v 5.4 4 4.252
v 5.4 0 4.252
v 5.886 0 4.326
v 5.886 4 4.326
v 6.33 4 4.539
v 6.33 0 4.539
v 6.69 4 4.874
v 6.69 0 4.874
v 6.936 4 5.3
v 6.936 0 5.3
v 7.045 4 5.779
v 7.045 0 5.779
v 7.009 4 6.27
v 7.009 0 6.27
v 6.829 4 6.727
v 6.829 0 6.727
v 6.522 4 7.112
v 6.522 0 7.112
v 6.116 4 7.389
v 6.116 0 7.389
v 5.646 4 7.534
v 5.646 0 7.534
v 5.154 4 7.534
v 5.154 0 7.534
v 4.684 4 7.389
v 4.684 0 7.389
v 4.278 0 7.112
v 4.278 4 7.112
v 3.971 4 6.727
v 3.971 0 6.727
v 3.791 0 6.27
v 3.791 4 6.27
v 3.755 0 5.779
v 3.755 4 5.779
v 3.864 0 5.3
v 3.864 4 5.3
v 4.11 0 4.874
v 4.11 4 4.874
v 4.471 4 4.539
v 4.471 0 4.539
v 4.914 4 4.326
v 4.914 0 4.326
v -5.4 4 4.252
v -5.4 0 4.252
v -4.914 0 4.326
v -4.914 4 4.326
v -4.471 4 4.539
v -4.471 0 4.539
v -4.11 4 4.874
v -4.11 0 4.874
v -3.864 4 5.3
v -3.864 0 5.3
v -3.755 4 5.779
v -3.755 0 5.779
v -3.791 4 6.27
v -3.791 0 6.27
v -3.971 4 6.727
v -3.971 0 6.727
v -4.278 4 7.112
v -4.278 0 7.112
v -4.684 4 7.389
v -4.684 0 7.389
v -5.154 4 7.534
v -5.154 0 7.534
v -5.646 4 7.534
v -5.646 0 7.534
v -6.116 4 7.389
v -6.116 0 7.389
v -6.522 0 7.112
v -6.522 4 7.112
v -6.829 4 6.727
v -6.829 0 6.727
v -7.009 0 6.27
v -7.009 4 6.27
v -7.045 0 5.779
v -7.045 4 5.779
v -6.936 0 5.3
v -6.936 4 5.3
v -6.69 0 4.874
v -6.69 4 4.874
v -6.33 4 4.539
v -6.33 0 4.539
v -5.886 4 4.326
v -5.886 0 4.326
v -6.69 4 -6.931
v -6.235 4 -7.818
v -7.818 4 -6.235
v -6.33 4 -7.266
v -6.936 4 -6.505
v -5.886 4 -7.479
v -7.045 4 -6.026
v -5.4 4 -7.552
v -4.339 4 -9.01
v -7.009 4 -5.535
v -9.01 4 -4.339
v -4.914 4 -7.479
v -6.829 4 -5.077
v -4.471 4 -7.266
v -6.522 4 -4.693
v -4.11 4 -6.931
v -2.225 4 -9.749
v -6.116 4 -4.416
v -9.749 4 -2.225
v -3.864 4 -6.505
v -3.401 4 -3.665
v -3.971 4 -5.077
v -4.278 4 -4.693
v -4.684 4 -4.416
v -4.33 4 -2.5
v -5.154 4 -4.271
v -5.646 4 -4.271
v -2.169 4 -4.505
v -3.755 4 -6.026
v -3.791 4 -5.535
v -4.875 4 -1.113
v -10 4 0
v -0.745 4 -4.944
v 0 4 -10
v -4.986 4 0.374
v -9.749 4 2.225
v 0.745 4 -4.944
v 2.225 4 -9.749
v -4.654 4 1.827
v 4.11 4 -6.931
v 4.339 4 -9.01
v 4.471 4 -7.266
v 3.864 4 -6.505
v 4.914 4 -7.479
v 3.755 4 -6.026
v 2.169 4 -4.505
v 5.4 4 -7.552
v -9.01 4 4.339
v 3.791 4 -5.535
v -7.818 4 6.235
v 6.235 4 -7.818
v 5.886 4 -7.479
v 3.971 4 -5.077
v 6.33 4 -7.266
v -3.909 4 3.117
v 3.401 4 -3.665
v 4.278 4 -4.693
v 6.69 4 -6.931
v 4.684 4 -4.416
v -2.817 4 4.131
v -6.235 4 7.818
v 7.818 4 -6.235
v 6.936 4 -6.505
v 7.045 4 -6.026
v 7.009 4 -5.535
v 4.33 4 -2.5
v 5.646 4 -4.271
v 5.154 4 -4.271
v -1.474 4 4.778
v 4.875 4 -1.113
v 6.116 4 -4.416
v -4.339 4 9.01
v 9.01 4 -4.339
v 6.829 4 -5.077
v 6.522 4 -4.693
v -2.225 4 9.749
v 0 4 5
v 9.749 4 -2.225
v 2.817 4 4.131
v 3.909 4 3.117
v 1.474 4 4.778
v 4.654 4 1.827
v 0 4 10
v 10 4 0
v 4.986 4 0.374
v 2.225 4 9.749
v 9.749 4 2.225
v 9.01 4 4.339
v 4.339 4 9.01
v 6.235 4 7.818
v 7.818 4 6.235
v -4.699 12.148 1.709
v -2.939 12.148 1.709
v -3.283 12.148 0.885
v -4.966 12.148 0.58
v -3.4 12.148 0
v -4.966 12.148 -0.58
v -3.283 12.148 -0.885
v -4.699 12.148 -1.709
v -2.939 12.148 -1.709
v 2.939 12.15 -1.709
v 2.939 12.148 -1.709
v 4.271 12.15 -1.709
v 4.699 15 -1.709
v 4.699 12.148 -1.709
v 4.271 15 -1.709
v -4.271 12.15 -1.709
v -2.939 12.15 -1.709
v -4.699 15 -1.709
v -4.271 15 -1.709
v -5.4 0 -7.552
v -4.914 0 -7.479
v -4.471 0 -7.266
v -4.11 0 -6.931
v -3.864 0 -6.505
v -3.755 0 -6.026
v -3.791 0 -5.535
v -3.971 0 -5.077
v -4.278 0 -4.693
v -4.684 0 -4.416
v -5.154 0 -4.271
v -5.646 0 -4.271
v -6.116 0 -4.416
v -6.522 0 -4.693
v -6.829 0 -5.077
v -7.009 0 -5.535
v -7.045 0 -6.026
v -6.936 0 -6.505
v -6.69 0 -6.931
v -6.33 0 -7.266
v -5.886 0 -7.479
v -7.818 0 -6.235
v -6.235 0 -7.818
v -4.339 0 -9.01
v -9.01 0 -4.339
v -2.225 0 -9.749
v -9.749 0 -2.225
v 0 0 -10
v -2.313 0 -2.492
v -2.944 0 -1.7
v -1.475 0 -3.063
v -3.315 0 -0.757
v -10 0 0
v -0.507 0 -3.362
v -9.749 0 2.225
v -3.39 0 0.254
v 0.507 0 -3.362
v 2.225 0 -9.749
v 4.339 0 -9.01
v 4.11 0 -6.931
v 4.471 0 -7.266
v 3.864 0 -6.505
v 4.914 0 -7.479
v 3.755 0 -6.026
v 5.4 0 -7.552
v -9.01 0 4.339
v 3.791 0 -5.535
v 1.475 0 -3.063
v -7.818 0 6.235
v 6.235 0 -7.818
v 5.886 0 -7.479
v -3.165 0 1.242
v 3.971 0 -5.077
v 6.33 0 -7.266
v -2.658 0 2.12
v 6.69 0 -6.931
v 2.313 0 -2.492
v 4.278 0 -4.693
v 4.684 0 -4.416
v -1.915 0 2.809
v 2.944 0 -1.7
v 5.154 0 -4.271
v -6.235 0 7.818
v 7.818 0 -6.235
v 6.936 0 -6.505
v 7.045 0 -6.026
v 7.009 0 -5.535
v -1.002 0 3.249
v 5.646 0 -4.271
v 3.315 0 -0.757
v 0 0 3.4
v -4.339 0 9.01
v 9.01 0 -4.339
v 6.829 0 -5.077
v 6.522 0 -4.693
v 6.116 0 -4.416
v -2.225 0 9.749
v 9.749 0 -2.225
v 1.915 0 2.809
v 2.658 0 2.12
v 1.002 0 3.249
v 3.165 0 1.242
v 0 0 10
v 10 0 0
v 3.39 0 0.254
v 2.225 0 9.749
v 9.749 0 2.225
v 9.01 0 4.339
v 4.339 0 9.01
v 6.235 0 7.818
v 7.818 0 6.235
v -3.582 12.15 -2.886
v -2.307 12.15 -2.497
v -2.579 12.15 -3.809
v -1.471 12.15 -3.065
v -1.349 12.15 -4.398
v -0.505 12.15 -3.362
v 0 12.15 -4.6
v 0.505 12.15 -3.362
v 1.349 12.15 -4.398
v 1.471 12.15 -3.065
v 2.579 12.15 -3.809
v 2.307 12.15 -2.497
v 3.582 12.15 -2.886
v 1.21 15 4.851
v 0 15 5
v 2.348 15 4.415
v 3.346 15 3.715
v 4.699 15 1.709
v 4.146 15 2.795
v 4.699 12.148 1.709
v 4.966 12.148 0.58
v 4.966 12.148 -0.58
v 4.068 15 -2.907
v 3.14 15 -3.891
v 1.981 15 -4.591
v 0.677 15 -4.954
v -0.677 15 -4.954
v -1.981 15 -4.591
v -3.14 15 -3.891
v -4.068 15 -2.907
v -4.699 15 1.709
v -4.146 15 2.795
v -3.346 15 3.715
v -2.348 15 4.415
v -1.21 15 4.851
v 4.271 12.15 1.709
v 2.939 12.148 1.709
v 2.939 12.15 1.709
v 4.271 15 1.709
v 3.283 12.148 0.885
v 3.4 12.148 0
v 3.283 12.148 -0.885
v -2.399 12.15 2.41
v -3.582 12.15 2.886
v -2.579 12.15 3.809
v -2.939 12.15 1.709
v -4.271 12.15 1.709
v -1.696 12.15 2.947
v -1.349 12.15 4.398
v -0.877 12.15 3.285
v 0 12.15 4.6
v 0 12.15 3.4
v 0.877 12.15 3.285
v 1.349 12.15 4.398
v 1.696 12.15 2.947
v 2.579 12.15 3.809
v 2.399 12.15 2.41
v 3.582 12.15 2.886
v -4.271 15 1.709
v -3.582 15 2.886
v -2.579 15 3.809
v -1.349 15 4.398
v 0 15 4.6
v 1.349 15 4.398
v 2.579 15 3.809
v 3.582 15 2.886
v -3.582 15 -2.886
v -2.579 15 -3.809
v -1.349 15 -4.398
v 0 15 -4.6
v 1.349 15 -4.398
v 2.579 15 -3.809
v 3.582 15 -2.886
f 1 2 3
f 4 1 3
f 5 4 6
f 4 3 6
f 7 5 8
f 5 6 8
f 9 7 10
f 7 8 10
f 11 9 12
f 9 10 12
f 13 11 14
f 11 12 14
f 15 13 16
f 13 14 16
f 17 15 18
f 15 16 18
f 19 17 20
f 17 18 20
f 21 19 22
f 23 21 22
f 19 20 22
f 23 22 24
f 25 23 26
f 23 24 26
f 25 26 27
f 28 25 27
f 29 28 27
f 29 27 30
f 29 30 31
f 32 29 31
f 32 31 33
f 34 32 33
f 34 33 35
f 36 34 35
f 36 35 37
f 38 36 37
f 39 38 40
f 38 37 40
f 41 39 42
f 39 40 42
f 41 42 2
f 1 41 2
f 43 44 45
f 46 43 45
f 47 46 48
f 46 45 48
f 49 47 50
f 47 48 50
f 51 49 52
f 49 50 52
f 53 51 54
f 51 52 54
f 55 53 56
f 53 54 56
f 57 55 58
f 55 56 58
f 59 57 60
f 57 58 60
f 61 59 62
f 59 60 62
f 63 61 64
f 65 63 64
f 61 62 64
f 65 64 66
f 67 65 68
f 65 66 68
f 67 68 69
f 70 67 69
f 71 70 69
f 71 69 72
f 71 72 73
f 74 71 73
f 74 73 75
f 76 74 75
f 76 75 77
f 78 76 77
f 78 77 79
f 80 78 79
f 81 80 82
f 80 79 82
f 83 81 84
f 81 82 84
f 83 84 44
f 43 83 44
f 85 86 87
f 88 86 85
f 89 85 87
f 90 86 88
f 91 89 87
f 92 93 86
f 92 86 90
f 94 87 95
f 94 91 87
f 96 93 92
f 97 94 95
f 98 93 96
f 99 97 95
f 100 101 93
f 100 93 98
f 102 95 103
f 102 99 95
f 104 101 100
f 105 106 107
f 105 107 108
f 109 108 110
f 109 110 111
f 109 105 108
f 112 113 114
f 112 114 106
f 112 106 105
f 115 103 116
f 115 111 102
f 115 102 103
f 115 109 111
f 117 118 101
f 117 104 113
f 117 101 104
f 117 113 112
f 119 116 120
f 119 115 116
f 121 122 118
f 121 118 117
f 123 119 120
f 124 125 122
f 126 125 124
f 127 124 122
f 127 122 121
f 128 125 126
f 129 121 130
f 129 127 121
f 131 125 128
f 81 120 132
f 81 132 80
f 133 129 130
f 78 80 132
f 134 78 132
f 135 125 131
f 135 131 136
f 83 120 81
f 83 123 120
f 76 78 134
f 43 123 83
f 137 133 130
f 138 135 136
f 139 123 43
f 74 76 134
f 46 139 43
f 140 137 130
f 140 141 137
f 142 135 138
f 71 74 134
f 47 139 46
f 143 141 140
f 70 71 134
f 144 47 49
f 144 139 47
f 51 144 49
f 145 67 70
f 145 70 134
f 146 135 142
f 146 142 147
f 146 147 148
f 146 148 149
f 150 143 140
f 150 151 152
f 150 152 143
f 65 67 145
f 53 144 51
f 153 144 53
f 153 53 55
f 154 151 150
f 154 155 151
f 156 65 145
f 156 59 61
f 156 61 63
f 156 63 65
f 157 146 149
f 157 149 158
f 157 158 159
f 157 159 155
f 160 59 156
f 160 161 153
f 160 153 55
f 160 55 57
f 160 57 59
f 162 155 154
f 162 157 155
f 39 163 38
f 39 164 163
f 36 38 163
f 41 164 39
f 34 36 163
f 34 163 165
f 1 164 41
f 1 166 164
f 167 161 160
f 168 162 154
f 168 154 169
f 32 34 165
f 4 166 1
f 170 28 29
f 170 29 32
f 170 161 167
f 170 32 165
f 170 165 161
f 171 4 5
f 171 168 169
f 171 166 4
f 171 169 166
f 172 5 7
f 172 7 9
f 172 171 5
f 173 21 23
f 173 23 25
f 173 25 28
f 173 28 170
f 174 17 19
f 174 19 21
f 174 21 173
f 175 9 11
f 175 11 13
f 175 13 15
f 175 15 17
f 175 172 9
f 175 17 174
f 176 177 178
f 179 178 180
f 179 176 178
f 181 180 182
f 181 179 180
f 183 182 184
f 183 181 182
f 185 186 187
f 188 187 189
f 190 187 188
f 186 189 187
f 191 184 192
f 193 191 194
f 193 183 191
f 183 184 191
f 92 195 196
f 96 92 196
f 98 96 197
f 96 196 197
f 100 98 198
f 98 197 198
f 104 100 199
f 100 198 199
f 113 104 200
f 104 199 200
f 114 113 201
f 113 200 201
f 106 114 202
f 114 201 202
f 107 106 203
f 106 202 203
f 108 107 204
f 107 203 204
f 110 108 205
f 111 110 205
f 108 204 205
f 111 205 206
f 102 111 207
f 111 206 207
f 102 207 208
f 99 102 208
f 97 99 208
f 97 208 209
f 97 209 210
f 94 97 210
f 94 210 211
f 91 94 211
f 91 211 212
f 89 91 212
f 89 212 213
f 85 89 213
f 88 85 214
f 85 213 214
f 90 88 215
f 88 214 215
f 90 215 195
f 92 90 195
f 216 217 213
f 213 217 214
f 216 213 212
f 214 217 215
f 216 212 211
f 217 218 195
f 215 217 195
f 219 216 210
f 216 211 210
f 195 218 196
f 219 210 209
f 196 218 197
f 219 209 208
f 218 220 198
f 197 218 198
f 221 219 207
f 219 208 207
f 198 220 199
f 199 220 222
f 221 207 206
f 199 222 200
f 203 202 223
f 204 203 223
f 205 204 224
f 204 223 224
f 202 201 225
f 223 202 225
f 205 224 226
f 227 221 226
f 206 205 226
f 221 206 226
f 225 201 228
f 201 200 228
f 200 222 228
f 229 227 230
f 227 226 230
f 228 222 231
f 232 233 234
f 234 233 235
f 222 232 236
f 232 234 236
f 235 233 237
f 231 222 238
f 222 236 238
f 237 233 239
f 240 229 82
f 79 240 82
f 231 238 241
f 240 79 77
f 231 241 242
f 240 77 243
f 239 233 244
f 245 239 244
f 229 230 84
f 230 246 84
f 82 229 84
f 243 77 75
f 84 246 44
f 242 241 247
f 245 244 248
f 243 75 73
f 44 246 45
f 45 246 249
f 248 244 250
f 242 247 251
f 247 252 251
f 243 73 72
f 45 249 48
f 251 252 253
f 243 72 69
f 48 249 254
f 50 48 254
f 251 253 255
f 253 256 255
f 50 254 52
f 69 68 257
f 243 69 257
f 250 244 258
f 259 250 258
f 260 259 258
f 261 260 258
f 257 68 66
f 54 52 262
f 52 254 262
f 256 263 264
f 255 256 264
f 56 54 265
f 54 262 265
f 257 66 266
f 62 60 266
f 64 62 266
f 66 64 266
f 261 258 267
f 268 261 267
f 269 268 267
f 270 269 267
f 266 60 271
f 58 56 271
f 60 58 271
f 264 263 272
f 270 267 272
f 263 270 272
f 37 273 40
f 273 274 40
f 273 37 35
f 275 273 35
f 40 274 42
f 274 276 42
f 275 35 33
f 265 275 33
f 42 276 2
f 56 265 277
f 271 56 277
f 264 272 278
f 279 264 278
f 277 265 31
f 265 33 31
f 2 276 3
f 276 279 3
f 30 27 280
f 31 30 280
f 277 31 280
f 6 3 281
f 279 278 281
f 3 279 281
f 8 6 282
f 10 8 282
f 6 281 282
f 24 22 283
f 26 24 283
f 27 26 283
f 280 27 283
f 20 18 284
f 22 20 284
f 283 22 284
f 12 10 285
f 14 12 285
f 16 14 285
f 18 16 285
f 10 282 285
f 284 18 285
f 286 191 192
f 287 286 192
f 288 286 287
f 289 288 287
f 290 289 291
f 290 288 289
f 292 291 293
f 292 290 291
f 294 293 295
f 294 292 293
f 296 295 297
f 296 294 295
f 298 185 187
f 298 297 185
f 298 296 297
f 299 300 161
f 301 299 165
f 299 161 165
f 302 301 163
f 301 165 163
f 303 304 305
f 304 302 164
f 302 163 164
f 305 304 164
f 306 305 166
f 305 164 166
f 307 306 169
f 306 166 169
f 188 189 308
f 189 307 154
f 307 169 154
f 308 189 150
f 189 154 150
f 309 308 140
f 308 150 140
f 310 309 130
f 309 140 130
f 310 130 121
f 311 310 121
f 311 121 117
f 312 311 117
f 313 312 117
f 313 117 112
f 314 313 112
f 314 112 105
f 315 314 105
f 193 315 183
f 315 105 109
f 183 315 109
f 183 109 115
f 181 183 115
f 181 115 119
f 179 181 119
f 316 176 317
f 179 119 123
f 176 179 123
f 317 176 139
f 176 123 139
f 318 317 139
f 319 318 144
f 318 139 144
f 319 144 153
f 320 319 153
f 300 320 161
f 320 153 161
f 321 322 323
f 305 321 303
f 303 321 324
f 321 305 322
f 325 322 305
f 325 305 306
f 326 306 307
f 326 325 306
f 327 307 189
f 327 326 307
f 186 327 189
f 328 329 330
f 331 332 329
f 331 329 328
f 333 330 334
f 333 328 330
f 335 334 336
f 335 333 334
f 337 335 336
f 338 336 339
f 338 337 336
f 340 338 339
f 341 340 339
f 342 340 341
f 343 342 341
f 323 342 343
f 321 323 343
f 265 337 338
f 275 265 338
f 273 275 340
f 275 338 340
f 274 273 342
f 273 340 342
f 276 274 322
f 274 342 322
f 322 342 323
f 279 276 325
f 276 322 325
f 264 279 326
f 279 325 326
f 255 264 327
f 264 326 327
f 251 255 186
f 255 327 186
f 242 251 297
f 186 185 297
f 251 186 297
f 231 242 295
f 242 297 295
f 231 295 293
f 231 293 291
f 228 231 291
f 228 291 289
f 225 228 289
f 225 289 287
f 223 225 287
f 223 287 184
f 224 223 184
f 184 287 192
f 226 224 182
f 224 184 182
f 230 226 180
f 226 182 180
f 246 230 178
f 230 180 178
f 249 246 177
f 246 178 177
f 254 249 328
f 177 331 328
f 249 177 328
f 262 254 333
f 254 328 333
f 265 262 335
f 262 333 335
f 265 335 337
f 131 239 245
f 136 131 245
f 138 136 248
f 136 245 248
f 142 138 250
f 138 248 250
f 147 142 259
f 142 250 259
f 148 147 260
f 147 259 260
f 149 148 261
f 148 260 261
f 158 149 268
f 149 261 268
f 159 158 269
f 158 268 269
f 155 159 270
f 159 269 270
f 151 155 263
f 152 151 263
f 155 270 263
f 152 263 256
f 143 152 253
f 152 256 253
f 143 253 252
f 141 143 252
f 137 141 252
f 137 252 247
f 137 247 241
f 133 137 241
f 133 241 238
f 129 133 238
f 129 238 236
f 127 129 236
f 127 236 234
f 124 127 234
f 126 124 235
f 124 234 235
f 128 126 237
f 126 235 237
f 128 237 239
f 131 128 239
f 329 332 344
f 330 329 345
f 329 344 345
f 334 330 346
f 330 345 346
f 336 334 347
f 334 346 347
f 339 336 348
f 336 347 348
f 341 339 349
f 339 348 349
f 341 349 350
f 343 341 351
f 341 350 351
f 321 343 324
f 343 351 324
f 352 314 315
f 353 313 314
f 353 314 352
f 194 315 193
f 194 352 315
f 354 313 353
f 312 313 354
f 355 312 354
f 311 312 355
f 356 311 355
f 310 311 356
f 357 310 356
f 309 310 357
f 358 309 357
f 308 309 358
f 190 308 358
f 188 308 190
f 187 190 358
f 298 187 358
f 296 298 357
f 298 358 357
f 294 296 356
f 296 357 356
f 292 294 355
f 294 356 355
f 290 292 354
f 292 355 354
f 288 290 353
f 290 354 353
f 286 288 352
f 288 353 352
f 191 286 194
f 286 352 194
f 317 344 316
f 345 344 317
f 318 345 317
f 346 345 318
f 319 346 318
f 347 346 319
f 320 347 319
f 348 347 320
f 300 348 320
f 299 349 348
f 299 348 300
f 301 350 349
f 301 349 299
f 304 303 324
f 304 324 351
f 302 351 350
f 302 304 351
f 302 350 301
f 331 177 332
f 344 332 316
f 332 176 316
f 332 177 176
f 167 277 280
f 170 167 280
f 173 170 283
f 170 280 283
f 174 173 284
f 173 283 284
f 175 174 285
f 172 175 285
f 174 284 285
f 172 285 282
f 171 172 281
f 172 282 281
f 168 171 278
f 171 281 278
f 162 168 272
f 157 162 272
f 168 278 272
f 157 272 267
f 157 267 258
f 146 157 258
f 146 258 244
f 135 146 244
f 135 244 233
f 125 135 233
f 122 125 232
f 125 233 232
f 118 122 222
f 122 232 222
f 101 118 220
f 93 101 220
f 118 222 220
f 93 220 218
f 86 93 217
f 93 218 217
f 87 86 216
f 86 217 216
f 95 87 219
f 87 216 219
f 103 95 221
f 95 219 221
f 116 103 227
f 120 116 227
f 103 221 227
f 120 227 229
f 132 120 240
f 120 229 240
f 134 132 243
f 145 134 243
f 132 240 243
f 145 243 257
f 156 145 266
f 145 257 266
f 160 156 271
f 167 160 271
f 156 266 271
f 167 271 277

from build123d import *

# Parameters (mm, degrees)
SKETCH_1_R                   = 10
EXTRUDE_1_DEPTH              = 4
SKETCH_4_R                   = 1.65
CUT_EXTRUDE_1_DEPTH          = 4
SKETCH_5_R                   = 5
EXTRUDE_2_DEPTH              = 11
HOLE_WIZARD_M8_1_D           = 6.8
HOLE_WIZARD_M8_1_ON_FACE_2_D = 6.8
CUT_EXTRUDE_4_DEPTH          = 24.450776575
CUT_EXTRUDE_4_DEPTH_BACK     = 24.450776575
SKETCH_11_W                  = 3.417857142
SKETCH_11_H                  = 2.9
SKETCH_12_R                  = 4.6
CUT_EXTRUDE_5_DEPTH          = 2.85


with BuildPart() as part:
    # 草图1 → 凸台-拉伸1 (new body)
    with BuildSketch(Plane(origin=(0, 0, 0), x_dir=(1, 0, 0), z_dir=(0, 1, 0))):
        with Locations(Location((0, 0, 0), (0, 0, 270))):
            Circle(SKETCH_1_R)
    extrude(amount=EXTRUDE_1_DEPTH)

    # 草图4 → 切除-拉伸1 (cut)
    with BuildSketch(Plane(origin=(0, 0, 0), x_dir=(-1, 0, 0), z_dir=(0, -1, 0))):
        with Locations(Location((5.400107697, -5.902443296, 0), (0, 0, 90))):
            Circle(SKETCH_4_R)
        with Locations(Location((-5.400107697, -5.902443296, 0), (0, 0, 90))):
            Circle(SKETCH_4_R)
        with Locations(Location((-5.400107697, 5.902443296, 0), (0, 0, 90))):
            Circle(SKETCH_4_R)
        with Locations(Location((5.400107697, 5.902443296, 0), (0, 0, 90))):
            Circle(SKETCH_4_R)
    extrude(amount=-CUT_EXTRUDE_1_DEPTH, mode=Mode.SUBTRACT)

    # 草图5 → 凸台-拉伸2 (add)
    with BuildSketch(Plane(origin=(0, 4, 0), x_dir=(1, 0, 0), z_dir=(0, 1, 0))):
        with Locations(Location((0, 0, 0), (0, 0, 270))):
            Circle(SKETCH_5_R)
    extrude(amount=EXTRUDE_2_DEPTH)

    # M8 螺纹孔1 (through all)
    with Locations(Plane(origin=(0, 0, 0), x_dir=(0, 0, -1), z_dir=(0, -1, 0))):
        with Locations((0, 0)):
            Hole(HOLE_WIZARD_M8_1_D / 2)

    # M8 螺纹孔1 on face 2 (through all)
    with Locations(Plane.ZX.offset(15)):
        with Locations((0, 0)):
            Hole(HOLE_WIZARD_M8_1_ON_FACE_2_D / 2)

    # 草图11 → 切除-拉伸4 (cut, two sides: drawn at the far end of the back side and taken through both)
    with BuildSketch(Plane(origin=(4.997963928, 0, 0), x_dir=(0, 0, -1), z_dir=(1, 0, 0)).offset(-CUT_EXTRUDE_4_DEPTH_BACK)):
        with Locations((0, 13.597531036)):
            Rectangle(SKETCH_11_W, SKETCH_11_H)
    extrude(amount=CUT_EXTRUDE_4_DEPTH + CUT_EXTRUDE_4_DEPTH_BACK, mode=Mode.SUBTRACT)

    # 草图12 → 切除-拉伸5 (cut)
    with BuildSketch(Plane(origin=(0, 15, 0), x_dir=(1, 0, 0), z_dir=(0, 1, 0))):
        Circle(SKETCH_12_R)
    extrude(amount=-CUT_EXTRUDE_5_DEPTH, mode=Mode.SUBTRACT)


solid = part.part
